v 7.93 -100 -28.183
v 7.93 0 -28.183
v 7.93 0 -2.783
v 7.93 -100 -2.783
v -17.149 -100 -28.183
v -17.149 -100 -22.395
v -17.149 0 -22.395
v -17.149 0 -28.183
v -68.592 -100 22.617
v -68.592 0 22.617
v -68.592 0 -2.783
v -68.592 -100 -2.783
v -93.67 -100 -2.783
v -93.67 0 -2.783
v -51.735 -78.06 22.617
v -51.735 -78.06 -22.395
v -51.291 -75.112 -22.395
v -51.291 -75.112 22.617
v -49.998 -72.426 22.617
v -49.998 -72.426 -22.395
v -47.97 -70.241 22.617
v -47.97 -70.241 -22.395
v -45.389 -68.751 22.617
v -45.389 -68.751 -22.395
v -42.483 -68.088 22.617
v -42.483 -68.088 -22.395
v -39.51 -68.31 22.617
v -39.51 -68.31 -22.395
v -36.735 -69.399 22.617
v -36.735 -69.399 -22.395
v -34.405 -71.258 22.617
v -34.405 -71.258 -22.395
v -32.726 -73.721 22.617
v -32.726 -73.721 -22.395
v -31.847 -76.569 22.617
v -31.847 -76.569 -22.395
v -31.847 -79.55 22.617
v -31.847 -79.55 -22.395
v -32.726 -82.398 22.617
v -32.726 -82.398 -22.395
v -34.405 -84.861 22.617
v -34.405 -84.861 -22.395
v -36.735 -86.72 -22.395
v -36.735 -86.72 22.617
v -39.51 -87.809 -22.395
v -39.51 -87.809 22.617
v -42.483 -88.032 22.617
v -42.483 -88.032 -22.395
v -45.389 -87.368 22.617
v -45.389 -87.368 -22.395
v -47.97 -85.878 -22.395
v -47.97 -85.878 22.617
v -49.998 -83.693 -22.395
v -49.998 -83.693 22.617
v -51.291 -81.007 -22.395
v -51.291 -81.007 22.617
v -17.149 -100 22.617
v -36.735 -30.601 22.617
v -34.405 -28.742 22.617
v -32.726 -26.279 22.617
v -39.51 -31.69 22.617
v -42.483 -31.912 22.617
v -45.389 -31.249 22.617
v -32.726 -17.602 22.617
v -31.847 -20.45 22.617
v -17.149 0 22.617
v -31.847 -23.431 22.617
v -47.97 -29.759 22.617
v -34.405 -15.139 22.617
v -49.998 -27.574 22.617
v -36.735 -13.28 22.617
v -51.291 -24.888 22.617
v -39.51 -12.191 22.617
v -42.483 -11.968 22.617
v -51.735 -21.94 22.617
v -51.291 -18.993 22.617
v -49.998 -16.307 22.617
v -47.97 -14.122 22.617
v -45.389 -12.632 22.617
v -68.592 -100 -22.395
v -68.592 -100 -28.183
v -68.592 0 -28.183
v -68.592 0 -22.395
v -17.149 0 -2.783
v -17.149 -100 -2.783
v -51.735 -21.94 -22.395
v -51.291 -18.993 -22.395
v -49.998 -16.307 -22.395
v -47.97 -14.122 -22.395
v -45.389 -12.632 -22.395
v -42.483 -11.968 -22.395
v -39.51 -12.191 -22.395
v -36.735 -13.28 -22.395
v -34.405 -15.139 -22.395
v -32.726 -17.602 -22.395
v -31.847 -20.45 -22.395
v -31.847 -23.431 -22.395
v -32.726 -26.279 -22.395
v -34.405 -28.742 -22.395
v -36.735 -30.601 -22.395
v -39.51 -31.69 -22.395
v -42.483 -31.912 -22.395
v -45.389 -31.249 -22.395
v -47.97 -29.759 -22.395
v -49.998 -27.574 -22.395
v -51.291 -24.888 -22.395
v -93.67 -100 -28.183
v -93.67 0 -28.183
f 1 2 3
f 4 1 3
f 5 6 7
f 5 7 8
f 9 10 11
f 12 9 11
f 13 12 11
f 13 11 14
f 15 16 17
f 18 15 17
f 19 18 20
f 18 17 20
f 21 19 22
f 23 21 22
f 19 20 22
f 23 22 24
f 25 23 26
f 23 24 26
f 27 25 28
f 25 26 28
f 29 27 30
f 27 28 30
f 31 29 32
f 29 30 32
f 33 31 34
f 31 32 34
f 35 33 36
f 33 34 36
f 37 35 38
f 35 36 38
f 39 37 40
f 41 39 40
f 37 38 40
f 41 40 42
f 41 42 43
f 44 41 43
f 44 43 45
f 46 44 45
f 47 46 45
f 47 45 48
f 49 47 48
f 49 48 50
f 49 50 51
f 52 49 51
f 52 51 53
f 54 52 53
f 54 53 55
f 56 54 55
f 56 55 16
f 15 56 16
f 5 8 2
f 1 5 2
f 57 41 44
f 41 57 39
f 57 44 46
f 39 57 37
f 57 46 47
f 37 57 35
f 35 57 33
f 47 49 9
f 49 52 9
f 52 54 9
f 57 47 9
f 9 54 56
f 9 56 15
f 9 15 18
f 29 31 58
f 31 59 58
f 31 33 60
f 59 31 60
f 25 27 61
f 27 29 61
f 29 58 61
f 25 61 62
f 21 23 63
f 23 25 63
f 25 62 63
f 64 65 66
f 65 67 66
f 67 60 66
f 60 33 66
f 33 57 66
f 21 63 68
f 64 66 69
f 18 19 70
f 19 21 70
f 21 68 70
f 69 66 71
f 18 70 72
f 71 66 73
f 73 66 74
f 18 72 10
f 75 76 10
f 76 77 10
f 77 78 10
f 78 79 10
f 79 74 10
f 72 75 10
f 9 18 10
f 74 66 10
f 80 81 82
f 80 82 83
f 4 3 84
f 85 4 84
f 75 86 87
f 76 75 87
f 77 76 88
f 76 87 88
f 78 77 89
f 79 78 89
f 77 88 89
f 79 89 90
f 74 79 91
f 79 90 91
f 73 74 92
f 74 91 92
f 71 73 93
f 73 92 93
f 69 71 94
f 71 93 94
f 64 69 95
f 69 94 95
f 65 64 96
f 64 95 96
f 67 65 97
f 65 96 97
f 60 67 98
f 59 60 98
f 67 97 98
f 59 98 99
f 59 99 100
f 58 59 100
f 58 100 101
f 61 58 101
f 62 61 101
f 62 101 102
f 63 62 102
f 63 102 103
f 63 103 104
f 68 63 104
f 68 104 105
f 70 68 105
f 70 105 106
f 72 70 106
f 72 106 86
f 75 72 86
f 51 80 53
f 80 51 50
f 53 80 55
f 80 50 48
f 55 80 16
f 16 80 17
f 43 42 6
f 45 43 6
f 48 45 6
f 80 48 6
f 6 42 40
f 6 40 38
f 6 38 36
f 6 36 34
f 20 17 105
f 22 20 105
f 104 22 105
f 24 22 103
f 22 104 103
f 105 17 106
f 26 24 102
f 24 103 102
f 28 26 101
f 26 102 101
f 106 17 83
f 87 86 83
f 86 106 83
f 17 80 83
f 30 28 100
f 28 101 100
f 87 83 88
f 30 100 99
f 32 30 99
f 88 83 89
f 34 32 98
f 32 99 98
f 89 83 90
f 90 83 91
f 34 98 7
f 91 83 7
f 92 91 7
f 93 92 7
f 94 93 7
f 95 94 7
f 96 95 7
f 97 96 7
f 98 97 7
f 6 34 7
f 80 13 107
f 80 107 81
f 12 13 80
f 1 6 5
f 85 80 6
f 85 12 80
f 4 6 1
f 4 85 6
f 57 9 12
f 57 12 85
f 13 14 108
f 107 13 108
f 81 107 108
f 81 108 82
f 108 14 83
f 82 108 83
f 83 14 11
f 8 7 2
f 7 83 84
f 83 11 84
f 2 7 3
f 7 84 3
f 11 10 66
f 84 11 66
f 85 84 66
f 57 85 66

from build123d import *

# Parameters (mm, degrees)
F1_DEPTH = 100
F3_D     = 20


with BuildPart() as f1:
    # F0 (on Front) → F1 (new body)
    with BuildSketch(Plane.XZ):
        Polygon((-17.148554, -2.782671), (-17.148554, 22.617329), (-42.870075, 22.617329), (-42.870075, -22.395332), (-17.148554, -22.395332), (-17.148554, -28.182671), (7.929928, -28.182671), (7.929928, -2.782671), align=None)
        Polygon((-42.870075, -22.395332), (-42.870075, 22.617329), (-68.591596, 22.617329), (-68.591596, -2.782671), (-93.670078, -2.782671), (-93.670078, -28.182671), (-68.591596, -28.182671), (-68.591596, -22.395332), align=None)
    extrude(amount=F1_DEPTH)

    # F3 (through all)
    with Locations(Plane.XY.offset(22.617329)):
        with Locations((-41.735466, -21.940365), (-41.735466, -78.059635)):
            Hole(F3_D / 2)


solid = f1.part
